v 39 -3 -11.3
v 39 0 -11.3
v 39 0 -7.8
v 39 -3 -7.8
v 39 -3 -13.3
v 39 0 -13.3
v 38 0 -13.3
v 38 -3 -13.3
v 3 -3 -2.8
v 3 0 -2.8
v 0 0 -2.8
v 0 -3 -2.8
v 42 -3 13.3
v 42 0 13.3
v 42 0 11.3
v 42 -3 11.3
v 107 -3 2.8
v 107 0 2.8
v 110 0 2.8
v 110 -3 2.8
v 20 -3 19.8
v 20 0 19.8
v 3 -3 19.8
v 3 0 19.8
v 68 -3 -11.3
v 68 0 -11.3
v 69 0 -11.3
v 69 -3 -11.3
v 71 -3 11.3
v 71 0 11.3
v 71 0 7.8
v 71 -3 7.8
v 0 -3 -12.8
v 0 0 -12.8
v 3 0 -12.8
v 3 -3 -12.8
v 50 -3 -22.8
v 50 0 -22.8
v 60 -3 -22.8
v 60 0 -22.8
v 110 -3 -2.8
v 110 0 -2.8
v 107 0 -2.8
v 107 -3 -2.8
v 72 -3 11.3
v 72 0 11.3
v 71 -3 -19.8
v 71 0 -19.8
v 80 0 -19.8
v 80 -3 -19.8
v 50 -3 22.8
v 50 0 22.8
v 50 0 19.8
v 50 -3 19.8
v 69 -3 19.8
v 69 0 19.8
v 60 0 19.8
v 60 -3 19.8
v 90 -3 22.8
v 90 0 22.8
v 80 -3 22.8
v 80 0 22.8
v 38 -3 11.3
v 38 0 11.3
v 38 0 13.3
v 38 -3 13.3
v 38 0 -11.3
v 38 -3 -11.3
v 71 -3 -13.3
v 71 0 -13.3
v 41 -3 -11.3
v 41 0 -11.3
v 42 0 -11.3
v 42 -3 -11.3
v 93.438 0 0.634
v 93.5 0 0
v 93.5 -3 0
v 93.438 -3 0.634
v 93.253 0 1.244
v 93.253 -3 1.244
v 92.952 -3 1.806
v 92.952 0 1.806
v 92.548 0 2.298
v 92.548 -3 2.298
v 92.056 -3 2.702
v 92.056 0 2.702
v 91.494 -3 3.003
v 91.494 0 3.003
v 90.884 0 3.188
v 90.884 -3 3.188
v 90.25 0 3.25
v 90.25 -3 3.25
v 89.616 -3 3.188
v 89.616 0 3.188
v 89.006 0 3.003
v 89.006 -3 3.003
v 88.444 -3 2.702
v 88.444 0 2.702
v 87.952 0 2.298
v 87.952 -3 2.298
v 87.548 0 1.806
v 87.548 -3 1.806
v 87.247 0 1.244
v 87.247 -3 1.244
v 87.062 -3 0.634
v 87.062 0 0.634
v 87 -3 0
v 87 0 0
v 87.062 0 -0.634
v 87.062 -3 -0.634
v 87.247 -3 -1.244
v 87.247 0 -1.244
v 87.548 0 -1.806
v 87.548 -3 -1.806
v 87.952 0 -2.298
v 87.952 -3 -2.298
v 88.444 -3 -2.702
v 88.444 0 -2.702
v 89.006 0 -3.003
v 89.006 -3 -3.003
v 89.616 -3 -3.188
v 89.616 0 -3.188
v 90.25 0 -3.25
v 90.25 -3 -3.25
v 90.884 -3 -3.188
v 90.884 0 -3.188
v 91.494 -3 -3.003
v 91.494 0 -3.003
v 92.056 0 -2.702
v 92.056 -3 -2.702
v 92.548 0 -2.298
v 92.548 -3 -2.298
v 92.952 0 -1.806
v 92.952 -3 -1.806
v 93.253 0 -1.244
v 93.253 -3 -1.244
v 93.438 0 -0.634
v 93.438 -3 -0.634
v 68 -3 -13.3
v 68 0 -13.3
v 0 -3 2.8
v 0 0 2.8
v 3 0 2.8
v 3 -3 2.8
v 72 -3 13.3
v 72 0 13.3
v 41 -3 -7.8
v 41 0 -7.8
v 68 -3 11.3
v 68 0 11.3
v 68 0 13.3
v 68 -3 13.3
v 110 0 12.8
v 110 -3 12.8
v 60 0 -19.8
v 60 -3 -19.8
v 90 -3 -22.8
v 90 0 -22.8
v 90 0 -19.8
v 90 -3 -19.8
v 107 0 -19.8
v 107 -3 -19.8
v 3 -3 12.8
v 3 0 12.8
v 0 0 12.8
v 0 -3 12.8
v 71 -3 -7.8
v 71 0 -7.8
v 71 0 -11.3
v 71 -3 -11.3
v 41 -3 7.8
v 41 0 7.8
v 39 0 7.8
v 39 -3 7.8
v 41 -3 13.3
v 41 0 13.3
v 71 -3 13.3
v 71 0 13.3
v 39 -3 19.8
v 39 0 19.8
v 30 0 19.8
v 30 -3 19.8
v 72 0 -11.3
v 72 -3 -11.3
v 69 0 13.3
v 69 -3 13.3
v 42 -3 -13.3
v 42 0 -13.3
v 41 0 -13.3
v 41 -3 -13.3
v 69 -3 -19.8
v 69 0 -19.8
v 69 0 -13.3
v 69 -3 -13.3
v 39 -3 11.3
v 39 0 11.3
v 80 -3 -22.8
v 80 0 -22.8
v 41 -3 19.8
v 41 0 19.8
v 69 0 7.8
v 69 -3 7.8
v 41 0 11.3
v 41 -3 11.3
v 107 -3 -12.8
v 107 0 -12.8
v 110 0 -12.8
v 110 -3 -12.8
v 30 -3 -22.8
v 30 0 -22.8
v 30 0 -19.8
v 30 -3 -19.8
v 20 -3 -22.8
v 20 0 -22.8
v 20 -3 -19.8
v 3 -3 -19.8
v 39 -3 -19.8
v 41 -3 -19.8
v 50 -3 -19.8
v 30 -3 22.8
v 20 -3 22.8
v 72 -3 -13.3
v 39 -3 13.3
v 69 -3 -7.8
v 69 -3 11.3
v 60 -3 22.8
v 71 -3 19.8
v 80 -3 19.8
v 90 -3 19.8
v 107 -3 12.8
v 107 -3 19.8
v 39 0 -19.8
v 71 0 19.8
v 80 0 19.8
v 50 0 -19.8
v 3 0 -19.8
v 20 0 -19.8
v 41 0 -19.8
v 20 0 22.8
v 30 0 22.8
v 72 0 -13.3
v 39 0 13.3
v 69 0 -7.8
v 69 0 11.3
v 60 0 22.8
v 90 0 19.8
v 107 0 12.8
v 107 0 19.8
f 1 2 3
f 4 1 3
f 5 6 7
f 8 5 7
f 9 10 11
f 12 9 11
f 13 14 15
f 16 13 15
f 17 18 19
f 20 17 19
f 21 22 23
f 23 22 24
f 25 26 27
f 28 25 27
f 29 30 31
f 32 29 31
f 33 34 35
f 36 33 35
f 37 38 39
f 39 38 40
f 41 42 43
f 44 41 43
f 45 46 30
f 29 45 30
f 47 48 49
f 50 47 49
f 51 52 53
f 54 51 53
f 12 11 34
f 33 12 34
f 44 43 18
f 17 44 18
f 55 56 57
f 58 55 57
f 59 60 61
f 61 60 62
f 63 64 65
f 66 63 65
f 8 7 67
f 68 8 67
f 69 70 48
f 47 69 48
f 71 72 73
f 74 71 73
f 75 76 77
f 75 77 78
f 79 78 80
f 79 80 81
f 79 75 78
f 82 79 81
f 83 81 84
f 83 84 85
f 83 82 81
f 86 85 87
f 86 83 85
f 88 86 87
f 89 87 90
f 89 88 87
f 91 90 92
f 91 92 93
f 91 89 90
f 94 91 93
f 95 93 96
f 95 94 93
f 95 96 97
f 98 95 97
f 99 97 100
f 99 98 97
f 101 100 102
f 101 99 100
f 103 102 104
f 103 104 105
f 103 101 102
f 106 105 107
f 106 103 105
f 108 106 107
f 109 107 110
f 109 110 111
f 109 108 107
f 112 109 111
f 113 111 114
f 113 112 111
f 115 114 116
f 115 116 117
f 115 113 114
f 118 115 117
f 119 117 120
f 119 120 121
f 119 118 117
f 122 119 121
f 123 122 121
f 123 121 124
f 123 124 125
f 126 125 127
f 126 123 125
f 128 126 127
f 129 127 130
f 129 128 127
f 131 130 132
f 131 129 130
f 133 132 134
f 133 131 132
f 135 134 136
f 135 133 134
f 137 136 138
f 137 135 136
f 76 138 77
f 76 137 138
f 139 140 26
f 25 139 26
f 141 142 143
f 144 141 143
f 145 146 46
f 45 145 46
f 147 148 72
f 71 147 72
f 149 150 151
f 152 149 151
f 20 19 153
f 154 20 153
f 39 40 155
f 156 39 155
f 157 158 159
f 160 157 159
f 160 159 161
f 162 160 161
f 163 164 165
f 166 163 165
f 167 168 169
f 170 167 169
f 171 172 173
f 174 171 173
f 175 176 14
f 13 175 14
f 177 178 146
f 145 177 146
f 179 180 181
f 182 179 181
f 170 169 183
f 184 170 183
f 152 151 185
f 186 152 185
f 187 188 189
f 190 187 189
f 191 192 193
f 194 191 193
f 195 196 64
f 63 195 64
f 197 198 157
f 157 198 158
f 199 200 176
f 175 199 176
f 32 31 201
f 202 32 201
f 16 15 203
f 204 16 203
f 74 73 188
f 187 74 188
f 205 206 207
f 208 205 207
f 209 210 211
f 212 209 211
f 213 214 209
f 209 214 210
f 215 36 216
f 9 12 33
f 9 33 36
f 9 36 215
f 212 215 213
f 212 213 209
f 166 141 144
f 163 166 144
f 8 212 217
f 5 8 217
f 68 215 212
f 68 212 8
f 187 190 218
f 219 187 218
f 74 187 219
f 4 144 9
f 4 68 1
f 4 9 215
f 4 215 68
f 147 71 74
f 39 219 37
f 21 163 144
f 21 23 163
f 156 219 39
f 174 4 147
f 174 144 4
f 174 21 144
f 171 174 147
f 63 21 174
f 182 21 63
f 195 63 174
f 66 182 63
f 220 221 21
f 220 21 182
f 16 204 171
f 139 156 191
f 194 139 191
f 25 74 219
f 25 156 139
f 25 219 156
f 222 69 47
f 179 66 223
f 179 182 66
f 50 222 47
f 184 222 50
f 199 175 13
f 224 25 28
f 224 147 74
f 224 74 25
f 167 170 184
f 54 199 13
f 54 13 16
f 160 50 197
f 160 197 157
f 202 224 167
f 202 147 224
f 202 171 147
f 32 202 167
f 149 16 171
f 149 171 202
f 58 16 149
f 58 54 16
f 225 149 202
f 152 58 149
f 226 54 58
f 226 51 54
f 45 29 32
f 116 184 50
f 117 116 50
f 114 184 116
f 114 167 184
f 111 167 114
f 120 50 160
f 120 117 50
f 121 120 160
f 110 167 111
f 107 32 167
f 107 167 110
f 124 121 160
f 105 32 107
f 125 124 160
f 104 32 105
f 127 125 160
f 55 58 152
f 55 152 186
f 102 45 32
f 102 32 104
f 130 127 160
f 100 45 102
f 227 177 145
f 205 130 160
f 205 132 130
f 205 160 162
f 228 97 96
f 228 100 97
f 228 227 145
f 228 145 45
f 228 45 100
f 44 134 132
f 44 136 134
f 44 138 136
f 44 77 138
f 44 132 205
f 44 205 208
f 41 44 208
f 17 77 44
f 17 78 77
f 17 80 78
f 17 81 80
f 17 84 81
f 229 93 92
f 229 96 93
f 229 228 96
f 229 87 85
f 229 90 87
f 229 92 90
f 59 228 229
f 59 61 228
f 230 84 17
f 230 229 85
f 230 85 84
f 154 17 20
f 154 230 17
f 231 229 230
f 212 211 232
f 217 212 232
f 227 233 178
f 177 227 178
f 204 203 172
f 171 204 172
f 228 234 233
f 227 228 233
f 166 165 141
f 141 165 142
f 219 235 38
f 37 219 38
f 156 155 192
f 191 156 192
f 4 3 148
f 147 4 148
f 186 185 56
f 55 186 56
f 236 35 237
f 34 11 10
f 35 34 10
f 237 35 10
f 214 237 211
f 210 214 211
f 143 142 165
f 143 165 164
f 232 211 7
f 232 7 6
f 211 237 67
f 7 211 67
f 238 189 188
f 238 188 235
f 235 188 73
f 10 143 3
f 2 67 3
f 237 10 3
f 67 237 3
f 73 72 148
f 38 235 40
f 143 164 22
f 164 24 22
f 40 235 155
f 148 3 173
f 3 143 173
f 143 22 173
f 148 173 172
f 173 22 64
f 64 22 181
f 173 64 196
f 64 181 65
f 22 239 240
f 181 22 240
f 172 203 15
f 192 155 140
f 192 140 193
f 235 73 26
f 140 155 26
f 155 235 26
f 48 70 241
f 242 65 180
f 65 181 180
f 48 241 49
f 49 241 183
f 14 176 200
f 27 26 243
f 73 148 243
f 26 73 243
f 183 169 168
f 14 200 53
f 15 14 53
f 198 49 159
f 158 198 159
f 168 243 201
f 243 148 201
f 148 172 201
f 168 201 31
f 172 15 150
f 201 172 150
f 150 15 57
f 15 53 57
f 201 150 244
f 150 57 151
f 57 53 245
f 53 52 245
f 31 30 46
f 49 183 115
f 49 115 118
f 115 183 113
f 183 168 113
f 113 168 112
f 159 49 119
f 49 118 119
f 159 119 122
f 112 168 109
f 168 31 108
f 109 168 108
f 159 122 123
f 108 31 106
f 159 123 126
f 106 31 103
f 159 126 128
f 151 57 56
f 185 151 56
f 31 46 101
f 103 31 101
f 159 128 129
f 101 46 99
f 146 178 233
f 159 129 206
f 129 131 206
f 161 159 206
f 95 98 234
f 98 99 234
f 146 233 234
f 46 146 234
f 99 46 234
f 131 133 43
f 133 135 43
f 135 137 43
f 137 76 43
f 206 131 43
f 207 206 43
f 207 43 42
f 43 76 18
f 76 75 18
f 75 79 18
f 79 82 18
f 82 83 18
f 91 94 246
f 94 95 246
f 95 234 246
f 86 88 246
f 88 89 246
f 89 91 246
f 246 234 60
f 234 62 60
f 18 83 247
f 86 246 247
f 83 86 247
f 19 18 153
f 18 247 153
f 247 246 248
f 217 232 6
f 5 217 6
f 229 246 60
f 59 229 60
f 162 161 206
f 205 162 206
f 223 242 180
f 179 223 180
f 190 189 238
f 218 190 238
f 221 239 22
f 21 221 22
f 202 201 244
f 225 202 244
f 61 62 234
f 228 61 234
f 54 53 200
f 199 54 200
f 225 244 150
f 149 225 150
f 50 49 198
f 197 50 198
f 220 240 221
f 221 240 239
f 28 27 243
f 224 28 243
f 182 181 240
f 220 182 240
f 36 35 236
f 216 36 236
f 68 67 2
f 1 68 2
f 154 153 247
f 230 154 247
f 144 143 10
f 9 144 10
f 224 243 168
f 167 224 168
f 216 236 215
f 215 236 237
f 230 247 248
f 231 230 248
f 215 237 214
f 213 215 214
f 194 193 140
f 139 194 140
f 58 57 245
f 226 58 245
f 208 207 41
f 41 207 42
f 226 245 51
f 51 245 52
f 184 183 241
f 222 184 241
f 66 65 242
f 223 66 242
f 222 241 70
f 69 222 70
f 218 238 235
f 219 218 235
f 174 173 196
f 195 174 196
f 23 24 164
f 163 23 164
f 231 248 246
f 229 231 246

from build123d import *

# Parameters (mm, degrees)
F0_R     = 3.25
F1_DEPTH = 3


with BuildPart() as f1:
    # F0 (on Front) → F1 (new body)
    with BuildSketch(Plane.XZ):
        Polygon((3, 2.8), (3, 0), (3, -2.8), (0, -2.8), (0, -12.8), (3, -12.8), (3, -19.8), (20, -19.8), (20, -22.8), (30, -22.8), (30, -19.8), (39, -19.8), (39, -13.3), (38, -13.3), (38, -11.3), (39, -11.3), (39, -7.8), (41, -7.8), (41, -11.3), (42, -11.3), (42, -13.3), (41, -13.3), (41, -19.8), (50, -19.8), (50, -22.8), (55, -22.8), (60, -22.8), (60, -19.8), (69, -19.8), (69, -13.3), (68, -13.3), (68, -11.3), (69, -11.3), (69, -7.8), (71, -7.8), (71, -11.3), (72, -11.3), (72, -13.3), (71, -13.3), (71, -19.8), (80, -19.8), (80, -22.8), (90, -22.8), (90, -19.8), (107, -19.8), (107, -12.8), (110, -12.8), (110, -2.8), (107, -2.8), (107, 0), (107, 2.8), (110, 2.8), (110, 12.8), (107, 12.8), (107, 19.8), (90, 19.8), (90, 22.8), (80, 22.8), (80, 19.8), (71, 19.8), (71, 13.3), (72, 13.3), (72, 11.3), (71, 11.3), (71, 7.8), (69, 7.8), (69, 11.3), (68, 11.3), (68, 13.3), (69, 13.3), (69, 19.8), (60, 19.8), (60, 22.8), (55, 22.8), (50, 22.8), (50, 19.8), (41, 19.8), (41, 13.3), (42, 13.3), (42, 11.3), (41, 11.3), (41, 7.8), (39, 7.8), (39, 11.3), (38, 11.3), (38, 13.3), (39, 13.3), (39, 19.8), (30, 19.8), (30, 22.8), (20, 22.8), (20, 19.8), (3, 19.8), (3, 12.8), (0, 12.8), (0, 2.8), align=None)
        with Locations((90.25, 0)):
            Circle(F0_R, mode=Mode.SUBTRACT)
    extrude(amount=F1_DEPTH)


solid = f1.part
